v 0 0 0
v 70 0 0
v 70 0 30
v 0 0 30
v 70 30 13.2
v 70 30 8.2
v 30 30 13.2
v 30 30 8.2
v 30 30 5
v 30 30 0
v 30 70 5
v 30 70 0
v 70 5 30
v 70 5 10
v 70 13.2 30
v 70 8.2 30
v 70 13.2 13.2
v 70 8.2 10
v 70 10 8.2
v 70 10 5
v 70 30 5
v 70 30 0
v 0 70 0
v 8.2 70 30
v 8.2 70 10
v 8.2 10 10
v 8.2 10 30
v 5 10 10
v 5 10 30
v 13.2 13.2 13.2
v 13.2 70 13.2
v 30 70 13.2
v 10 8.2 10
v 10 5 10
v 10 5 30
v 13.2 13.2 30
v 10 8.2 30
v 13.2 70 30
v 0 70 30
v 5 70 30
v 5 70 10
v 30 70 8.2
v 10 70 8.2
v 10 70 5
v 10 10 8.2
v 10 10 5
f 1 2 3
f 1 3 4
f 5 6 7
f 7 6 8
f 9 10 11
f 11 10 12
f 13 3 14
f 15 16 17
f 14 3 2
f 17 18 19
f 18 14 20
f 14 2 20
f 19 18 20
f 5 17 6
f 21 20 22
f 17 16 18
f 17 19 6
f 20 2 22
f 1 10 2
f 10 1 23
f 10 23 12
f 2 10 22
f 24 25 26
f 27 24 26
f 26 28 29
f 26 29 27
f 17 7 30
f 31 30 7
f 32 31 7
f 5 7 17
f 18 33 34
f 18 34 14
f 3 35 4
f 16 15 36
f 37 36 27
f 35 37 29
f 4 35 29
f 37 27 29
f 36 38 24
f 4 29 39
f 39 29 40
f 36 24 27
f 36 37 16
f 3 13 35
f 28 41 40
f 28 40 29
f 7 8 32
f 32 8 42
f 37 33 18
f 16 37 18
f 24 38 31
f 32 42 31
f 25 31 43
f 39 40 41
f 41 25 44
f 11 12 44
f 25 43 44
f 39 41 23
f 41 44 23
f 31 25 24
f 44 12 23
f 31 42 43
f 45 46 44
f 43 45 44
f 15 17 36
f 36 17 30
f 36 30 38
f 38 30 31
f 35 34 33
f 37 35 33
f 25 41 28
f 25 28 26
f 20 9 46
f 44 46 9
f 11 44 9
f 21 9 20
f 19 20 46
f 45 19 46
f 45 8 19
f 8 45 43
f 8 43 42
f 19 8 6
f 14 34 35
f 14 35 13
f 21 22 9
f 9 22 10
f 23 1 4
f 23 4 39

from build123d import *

# Parameters (mm, degrees)
PAD_DEPTH    = 5
PAD001_DEPTH = 3.2
PAD002_DEPTH = 5
POCKET_DEPTH = 3.2
PAD003_DEPTH = 16.8
PAD004_DEPTH = 16.8
SKETCH006_W  = 10
SKETCH006_H  = 10
PAD005_DEPTH = 20


with BuildPart() as part:
    # Sketch → Pad (new body)
    with BuildSketch(Plane.XY):
        Polygon((0, 0), (70, 0), (70, 30), (30, 30), (30, 70), (0, 70), align=None)
    extrude(amount=PAD_DEPTH)

    # Sketch001 (on DatumPlane) → Pad001 (join)
    with BuildSketch(Plane.XY.offset(5)):
        Polygon((0, 0), (70, 0), (70, 10), (10, 10), (10, 70), (0, 70), align=None)
    extrude(amount=PAD001_DEPTH)

    # Sketch002 (on DatumPlane) → Pad002 (join)
    with BuildSketch(Plane.XY.offset(8.2)):
        Polygon((0, 0), (70, 0), (70, 30), (30, 30), (30, 70), (0, 70), align=None)
    extrude(amount=PAD002_DEPTH)

    # Sketch003 (on DatumPlane) → Pocket (cut)
    with BuildSketch(Plane.XY.offset(13.2)):
        Polygon((5, 70), (5, 5), (70, 5), (70, 8.2), (8.2, 8.2), (8.2, 70), align=None)
    extrude(amount=-POCKET_DEPTH, mode=Mode.SUBTRACT)

    # Sketch004 (on DatumPlane) → Pad003 (join)
    with BuildSketch(Plane.XY.offset(13.2)):
        Polygon((0, 0), (0, 70), (5, 70), (5, 5), (70, 5), (70, 0), align=None)
    extrude(amount=PAD003_DEPTH)

    # Sketch005 (on DatumPlane) → Pad004 (join)
    with BuildSketch(Plane.XY.offset(13.2)):
        Polygon((70, 8.2), (70, 13.2), (13.2, 13.2), (13.2, 70), (8.2, 70), (8.2, 8.2), align=None)
    extrude(amount=PAD004_DEPTH)

    # Sketch006 (on DatumPlane) → Pad005 (join)
    with BuildSketch(Plane.XY.offset(10)):
        with Locations((5, 5)):
            Rectangle(SKETCH006_W, SKETCH006_H)
    extrude(amount=PAD005_DEPTH)


solid = part.part
